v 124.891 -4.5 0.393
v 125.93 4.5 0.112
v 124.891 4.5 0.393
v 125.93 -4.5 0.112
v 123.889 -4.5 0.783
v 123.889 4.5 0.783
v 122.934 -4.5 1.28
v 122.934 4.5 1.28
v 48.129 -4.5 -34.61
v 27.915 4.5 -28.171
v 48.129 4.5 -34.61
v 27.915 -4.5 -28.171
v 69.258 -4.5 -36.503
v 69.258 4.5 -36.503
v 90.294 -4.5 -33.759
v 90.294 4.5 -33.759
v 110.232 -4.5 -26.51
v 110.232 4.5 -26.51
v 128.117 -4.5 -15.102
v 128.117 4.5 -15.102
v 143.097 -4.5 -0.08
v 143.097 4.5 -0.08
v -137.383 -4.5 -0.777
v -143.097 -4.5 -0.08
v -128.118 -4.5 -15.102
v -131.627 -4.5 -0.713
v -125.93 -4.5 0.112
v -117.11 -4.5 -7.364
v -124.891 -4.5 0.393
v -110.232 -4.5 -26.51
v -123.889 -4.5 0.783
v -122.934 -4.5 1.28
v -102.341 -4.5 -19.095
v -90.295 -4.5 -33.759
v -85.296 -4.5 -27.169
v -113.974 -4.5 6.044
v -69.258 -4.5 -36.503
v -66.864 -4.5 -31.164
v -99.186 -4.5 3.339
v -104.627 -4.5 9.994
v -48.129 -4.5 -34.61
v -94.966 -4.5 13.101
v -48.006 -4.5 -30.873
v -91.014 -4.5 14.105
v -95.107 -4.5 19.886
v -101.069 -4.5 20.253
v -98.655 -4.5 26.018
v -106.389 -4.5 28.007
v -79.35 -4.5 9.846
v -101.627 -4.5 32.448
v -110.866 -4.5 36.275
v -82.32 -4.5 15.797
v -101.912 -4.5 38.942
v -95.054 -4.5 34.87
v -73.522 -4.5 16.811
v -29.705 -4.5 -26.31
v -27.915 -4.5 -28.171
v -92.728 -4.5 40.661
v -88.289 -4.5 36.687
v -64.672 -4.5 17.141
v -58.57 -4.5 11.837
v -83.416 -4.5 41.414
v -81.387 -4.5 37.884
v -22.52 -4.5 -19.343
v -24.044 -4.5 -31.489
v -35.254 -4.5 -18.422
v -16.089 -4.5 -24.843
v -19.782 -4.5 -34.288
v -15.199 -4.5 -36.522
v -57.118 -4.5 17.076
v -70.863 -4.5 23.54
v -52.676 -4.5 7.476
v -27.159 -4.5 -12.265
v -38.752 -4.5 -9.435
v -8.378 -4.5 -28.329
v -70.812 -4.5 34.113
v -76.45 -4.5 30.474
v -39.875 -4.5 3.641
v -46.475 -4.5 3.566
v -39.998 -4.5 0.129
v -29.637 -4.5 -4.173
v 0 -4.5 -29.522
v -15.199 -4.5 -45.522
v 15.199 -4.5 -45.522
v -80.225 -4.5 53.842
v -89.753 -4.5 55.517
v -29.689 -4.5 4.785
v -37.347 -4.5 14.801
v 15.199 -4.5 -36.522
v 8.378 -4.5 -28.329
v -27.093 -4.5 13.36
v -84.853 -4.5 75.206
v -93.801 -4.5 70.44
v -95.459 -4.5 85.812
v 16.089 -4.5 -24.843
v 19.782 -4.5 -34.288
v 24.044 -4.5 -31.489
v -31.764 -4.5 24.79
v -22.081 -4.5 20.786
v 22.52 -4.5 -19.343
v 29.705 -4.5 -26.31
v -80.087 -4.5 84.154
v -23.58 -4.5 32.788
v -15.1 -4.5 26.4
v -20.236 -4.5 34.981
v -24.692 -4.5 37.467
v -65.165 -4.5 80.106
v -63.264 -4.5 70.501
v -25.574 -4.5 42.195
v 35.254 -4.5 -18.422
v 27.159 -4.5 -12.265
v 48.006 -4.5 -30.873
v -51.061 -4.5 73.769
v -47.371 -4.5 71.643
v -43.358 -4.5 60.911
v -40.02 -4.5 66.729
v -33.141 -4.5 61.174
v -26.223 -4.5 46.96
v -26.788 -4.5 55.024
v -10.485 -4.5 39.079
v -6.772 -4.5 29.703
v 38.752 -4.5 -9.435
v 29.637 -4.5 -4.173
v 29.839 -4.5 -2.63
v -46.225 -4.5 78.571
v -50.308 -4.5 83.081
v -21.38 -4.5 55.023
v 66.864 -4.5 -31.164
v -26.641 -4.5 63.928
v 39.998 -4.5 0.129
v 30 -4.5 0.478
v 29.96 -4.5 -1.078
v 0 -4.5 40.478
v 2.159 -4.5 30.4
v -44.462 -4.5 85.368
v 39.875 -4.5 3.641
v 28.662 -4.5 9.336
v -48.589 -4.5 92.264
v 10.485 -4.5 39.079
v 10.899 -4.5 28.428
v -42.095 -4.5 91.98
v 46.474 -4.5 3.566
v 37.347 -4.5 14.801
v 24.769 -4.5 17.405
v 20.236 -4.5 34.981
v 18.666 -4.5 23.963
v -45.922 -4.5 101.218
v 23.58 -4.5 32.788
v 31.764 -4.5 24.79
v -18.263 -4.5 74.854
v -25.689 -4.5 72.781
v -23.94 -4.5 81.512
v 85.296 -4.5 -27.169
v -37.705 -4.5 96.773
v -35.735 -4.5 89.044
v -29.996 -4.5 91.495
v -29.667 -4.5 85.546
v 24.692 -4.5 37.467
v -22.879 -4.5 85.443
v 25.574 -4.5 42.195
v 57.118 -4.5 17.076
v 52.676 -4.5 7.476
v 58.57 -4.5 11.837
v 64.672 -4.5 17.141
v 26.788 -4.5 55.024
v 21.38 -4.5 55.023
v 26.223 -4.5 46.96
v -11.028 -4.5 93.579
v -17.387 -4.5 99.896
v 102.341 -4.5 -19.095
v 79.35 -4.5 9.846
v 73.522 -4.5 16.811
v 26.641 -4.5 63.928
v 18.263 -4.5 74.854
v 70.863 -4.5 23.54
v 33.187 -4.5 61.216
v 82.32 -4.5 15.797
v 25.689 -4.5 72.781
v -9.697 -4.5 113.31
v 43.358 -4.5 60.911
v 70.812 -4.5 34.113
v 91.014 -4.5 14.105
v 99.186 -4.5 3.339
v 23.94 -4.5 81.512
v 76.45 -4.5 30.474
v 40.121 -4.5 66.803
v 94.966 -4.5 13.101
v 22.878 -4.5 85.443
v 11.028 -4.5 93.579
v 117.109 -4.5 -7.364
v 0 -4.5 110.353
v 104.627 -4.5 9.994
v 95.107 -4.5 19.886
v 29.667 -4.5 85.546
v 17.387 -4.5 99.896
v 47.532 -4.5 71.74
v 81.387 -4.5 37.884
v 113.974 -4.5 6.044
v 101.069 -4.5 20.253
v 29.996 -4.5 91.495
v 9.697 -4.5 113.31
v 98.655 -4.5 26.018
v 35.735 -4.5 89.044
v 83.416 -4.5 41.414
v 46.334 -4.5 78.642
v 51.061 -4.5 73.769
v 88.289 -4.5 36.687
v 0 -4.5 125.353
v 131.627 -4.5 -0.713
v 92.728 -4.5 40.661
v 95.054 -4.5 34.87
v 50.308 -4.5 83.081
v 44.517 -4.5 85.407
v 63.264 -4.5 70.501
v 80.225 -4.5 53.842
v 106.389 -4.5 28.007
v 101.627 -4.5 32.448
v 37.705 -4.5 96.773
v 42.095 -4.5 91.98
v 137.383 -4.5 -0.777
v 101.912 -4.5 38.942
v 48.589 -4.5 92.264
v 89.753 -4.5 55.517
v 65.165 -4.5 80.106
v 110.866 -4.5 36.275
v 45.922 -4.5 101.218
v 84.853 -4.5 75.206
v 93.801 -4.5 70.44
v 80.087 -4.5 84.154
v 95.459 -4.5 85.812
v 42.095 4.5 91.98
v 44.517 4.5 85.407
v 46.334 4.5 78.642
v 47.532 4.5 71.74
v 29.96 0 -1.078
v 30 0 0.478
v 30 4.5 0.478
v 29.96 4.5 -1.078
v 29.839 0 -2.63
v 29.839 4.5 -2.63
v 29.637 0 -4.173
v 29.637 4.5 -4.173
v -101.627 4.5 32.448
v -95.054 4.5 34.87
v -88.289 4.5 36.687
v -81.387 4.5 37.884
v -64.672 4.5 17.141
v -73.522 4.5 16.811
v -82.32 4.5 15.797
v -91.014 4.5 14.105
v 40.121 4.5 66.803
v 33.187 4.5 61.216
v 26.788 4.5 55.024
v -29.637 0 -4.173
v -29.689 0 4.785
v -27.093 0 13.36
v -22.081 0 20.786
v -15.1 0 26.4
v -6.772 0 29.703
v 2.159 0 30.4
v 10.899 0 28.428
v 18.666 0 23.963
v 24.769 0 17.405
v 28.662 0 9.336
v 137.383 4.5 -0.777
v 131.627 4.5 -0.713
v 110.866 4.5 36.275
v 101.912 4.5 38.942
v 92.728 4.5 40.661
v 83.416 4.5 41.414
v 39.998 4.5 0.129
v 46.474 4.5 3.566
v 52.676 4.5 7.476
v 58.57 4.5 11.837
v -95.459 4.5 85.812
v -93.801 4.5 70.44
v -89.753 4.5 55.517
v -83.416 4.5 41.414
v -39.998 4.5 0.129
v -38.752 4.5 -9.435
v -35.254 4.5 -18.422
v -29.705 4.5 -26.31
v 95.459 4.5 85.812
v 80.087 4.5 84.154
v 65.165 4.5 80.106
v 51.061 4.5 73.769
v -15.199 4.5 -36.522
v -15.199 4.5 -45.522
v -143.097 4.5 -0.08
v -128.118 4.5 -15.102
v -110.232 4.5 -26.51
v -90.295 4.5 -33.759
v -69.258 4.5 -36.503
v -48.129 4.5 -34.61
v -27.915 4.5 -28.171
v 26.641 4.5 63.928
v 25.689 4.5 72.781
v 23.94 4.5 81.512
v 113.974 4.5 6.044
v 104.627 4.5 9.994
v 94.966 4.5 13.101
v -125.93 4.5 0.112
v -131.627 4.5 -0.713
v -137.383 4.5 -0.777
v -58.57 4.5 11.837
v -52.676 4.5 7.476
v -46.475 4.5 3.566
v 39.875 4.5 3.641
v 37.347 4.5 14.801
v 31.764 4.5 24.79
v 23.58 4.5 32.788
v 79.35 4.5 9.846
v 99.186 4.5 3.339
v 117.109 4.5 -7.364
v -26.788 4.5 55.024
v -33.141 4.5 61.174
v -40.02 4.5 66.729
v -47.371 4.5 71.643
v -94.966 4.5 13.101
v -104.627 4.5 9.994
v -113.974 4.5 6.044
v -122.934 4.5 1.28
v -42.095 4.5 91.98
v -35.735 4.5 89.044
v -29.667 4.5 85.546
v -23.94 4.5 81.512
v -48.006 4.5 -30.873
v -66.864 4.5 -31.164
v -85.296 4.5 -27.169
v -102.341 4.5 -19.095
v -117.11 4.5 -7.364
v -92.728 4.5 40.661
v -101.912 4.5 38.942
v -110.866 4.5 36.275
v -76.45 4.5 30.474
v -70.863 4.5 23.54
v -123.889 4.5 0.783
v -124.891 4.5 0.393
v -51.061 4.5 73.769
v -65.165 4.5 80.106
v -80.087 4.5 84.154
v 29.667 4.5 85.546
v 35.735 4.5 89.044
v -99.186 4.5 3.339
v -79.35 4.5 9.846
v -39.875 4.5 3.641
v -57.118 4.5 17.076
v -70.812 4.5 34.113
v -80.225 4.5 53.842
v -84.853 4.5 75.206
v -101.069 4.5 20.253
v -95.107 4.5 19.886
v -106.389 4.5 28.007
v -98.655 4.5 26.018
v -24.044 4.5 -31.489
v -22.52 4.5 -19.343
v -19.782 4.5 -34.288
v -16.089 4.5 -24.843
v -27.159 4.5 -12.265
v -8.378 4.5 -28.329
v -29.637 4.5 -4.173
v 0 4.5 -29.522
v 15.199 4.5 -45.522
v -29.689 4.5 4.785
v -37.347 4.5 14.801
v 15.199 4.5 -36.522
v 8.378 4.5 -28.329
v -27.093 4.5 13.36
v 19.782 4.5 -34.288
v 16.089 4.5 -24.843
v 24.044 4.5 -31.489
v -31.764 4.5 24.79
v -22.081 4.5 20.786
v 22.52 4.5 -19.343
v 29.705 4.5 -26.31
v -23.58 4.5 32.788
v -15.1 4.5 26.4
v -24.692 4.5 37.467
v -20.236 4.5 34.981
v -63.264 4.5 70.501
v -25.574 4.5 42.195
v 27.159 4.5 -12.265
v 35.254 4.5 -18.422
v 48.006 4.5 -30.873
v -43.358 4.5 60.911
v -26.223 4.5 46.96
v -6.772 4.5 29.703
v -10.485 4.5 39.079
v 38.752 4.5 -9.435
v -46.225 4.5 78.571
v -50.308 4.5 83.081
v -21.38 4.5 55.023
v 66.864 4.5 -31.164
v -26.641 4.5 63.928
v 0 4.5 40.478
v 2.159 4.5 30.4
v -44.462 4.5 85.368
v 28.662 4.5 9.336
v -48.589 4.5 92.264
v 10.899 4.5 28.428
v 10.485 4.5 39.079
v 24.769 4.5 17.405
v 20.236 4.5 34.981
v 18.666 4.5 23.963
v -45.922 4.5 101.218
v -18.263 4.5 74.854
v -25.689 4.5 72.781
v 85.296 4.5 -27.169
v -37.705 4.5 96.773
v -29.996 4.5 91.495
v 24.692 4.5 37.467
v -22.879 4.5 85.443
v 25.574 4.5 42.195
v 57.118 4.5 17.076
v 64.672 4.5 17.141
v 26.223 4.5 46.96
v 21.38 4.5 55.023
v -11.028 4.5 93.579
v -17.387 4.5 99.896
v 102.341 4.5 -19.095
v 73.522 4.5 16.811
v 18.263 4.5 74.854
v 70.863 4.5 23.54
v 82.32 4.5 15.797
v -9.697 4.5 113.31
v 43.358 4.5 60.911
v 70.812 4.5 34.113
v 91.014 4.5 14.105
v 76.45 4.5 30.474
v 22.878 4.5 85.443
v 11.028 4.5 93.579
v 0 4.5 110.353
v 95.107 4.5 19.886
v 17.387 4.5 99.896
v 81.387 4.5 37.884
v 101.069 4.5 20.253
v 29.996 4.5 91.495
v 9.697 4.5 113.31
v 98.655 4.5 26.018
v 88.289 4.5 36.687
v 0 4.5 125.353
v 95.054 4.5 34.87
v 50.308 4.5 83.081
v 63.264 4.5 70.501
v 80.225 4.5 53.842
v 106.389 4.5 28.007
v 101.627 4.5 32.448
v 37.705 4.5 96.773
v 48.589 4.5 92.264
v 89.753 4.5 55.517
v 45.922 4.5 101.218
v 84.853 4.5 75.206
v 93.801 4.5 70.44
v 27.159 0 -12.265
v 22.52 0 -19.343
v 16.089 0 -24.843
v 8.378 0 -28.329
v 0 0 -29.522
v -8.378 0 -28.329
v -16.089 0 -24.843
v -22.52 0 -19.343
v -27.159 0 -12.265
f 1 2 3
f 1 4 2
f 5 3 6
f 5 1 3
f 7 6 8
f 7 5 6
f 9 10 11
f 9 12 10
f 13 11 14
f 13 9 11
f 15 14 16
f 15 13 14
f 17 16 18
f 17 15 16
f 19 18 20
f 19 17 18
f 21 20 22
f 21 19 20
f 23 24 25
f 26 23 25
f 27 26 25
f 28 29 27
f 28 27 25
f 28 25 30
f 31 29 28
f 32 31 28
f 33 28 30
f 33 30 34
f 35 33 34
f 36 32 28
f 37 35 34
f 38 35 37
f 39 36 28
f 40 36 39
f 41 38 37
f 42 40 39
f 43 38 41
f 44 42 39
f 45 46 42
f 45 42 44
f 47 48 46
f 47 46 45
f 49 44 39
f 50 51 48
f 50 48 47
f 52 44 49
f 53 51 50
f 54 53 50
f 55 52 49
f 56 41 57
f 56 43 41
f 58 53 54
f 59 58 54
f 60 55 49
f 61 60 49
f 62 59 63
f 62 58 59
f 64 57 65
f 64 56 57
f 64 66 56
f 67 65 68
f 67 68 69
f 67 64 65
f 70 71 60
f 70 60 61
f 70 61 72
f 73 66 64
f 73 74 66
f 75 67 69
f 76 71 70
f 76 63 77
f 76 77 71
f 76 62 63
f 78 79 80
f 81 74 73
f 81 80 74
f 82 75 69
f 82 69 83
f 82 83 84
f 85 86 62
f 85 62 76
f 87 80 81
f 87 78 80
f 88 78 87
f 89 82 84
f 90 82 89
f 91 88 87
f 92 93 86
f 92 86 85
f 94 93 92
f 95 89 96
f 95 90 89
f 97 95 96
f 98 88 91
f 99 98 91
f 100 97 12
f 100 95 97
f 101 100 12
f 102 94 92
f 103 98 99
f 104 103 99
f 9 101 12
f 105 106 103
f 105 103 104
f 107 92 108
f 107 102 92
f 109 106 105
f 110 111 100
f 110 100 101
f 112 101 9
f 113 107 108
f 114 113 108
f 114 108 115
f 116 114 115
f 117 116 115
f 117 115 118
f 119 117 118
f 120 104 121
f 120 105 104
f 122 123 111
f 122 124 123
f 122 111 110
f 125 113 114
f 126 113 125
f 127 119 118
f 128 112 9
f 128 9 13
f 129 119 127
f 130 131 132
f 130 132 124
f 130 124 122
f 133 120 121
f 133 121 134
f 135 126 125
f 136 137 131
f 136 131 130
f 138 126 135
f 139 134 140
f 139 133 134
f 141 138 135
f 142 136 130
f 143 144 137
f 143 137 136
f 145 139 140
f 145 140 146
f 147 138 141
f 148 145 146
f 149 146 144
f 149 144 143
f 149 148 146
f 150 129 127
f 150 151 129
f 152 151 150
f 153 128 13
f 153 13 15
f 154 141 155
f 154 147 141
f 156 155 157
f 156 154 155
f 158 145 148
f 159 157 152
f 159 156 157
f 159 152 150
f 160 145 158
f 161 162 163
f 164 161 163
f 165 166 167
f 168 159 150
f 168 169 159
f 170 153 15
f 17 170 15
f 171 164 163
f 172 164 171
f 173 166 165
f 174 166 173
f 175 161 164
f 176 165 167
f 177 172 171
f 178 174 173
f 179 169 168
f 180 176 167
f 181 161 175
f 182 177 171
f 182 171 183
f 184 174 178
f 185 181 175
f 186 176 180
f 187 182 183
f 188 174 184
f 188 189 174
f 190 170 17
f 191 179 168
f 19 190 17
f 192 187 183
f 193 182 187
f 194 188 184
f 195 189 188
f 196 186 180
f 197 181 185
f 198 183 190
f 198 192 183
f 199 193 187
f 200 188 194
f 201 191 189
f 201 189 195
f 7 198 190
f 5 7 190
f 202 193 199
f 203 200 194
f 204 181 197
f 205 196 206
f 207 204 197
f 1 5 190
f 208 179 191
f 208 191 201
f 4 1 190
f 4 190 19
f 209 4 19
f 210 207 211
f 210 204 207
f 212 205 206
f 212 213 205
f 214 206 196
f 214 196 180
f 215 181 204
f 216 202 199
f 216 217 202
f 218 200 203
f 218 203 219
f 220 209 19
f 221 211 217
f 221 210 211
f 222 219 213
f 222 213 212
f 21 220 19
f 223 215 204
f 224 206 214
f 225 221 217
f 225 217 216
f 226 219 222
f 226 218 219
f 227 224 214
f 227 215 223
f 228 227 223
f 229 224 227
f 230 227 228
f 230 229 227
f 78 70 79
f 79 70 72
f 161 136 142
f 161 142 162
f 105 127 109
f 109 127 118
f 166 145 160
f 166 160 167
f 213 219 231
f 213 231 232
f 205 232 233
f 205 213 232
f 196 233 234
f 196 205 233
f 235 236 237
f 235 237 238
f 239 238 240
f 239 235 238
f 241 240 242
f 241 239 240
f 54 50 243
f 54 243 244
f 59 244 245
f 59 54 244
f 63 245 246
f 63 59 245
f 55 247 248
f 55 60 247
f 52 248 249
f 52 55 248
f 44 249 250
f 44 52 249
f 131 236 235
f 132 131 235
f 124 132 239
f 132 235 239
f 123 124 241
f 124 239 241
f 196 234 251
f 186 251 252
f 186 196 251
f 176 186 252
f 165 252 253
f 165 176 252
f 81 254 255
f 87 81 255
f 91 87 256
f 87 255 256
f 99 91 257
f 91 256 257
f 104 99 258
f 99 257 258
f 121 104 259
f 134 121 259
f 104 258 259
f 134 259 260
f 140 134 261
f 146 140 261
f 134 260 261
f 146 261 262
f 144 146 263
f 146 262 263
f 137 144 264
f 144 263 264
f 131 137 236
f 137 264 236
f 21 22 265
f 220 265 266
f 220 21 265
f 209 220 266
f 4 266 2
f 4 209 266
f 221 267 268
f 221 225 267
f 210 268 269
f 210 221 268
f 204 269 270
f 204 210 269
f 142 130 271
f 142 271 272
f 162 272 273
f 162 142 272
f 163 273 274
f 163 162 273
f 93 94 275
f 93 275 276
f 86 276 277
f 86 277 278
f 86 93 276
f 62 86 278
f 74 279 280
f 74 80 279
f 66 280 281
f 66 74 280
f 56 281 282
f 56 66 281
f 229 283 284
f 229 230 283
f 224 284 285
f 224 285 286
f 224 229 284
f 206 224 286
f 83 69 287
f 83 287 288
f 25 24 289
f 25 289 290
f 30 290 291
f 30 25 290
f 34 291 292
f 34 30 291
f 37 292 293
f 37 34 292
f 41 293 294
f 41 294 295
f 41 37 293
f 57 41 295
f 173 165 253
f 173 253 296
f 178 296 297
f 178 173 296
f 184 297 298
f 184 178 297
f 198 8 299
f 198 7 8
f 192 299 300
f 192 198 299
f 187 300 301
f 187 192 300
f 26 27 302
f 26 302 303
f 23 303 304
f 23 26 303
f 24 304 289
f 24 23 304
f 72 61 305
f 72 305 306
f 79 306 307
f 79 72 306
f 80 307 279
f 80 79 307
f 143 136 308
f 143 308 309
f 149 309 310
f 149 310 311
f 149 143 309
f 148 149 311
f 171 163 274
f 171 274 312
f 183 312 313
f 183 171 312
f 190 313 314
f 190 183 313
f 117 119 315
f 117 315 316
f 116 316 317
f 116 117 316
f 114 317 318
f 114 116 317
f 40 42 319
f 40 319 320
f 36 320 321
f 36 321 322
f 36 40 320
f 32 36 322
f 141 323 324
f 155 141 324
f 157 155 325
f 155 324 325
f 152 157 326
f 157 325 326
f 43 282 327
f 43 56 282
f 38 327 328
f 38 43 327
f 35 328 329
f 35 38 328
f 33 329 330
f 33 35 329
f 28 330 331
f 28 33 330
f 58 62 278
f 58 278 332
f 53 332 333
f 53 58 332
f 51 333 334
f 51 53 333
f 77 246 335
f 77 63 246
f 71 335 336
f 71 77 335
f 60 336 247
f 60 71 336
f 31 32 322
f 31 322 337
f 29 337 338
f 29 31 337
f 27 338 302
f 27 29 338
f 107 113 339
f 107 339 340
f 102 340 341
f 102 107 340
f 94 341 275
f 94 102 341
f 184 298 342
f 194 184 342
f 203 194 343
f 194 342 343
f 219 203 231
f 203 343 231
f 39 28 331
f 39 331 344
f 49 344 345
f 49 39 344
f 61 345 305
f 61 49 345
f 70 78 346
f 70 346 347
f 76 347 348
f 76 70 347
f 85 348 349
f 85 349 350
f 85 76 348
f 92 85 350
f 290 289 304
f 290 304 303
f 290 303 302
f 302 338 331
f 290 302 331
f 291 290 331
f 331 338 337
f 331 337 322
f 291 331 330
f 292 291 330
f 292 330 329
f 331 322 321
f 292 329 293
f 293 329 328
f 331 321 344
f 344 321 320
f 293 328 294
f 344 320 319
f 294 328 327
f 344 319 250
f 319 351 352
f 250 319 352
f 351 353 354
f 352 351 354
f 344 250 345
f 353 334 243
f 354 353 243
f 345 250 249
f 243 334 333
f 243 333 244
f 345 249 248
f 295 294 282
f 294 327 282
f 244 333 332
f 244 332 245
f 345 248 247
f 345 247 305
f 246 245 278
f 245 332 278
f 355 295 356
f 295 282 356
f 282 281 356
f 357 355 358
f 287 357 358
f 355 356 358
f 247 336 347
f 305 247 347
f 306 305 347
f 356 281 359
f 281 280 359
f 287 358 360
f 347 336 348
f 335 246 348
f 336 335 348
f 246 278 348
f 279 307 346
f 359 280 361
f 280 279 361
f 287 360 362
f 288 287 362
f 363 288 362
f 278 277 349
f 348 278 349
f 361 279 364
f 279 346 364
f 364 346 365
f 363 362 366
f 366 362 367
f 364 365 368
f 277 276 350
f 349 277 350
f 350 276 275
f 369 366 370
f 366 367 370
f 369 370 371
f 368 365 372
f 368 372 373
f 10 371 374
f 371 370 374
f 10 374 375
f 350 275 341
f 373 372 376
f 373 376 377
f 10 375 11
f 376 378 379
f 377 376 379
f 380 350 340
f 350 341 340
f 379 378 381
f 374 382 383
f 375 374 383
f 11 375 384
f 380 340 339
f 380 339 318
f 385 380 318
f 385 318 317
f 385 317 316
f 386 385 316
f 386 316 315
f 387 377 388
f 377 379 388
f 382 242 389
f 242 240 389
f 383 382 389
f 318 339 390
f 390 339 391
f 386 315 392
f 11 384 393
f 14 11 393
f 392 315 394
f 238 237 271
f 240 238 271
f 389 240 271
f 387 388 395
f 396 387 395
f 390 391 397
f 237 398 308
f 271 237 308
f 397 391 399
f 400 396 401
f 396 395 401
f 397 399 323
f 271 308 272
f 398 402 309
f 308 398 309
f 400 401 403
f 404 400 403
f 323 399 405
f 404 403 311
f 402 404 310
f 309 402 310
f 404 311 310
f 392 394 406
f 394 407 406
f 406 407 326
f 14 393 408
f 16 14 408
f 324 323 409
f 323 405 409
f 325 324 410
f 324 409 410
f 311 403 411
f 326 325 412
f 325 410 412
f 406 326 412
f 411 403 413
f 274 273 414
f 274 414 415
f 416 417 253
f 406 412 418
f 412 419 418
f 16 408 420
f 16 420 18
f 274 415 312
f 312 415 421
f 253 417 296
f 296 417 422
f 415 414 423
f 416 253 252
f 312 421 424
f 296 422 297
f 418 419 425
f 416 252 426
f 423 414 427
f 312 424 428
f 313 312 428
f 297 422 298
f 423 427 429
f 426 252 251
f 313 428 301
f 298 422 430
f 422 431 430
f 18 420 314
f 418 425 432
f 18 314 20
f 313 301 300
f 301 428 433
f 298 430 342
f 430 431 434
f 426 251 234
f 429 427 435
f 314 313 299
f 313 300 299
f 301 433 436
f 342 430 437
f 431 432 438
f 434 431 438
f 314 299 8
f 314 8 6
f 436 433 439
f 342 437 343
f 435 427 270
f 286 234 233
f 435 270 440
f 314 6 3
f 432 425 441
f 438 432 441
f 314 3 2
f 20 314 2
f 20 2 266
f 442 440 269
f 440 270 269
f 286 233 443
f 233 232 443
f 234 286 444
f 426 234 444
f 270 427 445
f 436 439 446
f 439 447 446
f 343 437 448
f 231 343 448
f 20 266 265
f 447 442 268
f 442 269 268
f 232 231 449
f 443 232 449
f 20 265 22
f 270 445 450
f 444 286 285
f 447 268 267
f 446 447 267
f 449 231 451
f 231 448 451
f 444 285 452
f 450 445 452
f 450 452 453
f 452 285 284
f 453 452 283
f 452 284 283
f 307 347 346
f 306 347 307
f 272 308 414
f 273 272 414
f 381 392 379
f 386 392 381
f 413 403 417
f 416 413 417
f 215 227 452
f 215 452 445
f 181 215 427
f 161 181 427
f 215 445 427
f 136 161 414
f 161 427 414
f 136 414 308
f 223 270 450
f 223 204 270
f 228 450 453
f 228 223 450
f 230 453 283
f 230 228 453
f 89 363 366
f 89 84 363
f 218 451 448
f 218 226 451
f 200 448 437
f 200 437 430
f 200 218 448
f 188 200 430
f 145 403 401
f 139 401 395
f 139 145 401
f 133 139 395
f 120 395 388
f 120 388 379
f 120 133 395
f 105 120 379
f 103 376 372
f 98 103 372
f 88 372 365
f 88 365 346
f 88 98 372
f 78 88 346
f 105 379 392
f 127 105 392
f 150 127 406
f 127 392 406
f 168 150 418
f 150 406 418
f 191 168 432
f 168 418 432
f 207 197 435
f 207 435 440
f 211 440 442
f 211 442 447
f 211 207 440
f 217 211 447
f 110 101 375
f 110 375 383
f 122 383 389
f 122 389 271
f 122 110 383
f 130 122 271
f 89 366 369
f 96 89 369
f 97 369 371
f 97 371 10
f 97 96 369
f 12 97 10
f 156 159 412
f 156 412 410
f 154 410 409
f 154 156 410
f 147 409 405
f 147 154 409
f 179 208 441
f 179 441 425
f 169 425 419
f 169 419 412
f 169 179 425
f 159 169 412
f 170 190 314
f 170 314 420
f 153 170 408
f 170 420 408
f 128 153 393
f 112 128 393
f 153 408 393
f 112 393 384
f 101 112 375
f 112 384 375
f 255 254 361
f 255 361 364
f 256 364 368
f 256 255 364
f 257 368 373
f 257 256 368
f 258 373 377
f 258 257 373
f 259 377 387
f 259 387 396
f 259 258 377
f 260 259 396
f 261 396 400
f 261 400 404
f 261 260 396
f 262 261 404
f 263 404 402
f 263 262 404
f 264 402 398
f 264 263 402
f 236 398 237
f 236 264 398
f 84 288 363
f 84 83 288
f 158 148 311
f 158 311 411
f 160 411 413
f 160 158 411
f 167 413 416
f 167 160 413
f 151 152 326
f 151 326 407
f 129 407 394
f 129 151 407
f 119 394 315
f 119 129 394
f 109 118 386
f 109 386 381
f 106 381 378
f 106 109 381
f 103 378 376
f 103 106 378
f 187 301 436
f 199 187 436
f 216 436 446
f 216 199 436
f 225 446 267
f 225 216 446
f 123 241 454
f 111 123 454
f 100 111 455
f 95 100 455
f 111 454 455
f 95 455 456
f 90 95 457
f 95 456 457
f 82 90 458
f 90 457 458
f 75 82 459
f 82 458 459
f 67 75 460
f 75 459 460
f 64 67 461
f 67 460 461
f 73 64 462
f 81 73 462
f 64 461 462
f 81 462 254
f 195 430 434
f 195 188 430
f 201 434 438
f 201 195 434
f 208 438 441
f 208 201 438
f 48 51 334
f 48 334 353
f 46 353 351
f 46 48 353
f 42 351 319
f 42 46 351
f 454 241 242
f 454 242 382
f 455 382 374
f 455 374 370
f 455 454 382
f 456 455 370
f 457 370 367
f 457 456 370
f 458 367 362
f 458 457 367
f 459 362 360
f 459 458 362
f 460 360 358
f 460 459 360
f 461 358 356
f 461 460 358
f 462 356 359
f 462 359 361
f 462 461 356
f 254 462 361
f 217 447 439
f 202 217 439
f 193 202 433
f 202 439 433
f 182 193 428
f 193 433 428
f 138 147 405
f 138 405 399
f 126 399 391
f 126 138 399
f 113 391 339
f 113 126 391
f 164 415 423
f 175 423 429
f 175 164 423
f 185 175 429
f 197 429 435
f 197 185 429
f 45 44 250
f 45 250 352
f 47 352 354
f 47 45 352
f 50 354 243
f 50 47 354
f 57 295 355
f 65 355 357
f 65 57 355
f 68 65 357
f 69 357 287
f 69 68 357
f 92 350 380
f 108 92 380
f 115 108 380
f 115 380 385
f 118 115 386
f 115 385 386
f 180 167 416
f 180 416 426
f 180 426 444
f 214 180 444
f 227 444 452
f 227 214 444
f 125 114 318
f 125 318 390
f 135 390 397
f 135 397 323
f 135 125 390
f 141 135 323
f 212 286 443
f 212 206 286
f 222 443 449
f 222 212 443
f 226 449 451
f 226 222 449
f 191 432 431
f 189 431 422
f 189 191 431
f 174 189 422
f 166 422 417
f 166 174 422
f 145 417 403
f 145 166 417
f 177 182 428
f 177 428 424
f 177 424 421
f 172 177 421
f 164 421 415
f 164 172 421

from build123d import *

# Parameters (mm, degrees)
F1_DEPTH = 4.5


# Not quite as in the source:
# - ends of sketch curves that miss each other by under 0.0002 mm in the source are joined


with BuildPart() as f1:
    # F0 (on Front) → F1 (new body, symmetric)
    with BuildSketch(Plane.XZ):
        with BuildLine():
            ThreePointArc((22.8784841202, 85.4427339913), (13.8060493669, 106.7545909747), (-1.20352e-05, 125.3528970532))
            ThreePointArc((-1.20352e-05, 125.3528970532), (-13.8060738367, 106.7545832167), (-22.8785085989, 85.4427260857))
            ThreePointArc((-22.8785085989, 85.4427260857), (-33.781429845, 94.2345199978), (-45.9220242093, 101.2184408782))
            ThreePointArc((-45.9220242093, 101.2184408782), (-49.5683429395, 87.6953665193), (-51.06114092, 73.7691058897))
            ThreePointArc((-51.06114092, 73.7691058897), (-72.5460800364, 82.4236845525), (-95.4594281867, 85.8123133595))
            ThreePointArc((-95.4594281867, 85.8123133595), (-92.0708001004, 62.8989646397), (-83.4162216453, 41.4140256538))
            ThreePointArc((-83.4162216453, 41.4140256538), (-97.3424818216, 39.9212276371), (-110.8655561911, 36.2749088727))
            ThreePointArc((-110.8655561911, 36.2749088727), (-103.8306945008, 24.0599857757), (-94.9659655862, 13.1005055314))
            ThreePointArc((-94.9659655862, 13.1005055314), (-109.3441086085, 8.1228594383), (-122.9337436667, 1.2796299938))
            ThreePointArc((-122.9337436667, 1.2796299938), (-124.3847743538, 0.5744976537), (-125.9303092338, 0.1118710562))
            ThreePointArc((-125.9303092338, 0.1118710562), (-134.5040813307, -0.8405705466), (-143.0970012567, -0.0800174007))
            ThreePointArc((-143.0970012567, -0.0800174007), (-90.2945054943, -33.7590284811), (-27.9154142382, -28.1707970164))
            ThreePointArc((-27.9154142382, -28.1707970164), (-21.9577774473, -32.956766848), (-15.1986970778, -36.5224048048))
            Line((-15.1986970778, -36.5224048048), (-15.1986972, -45.5224051023))
            Line((-15.1986972, -45.5224051023), (15.1986718, -45.5224051023))
            Line((15.1986718, -45.5224051023), (15.1986718, -36.5224051023))
            ThreePointArc((15.1986718, -36.5224051023), (21.9577523614, -32.9567672985), (27.9153889991, -28.1707973067))
            ThreePointArc((27.9153889991, -28.1707973067), (90.2944800943, -33.7590284811), (143.096975735, -0.0800170504))
            ThreePointArc((143.096975735, -0.0800170504), (134.5040559307, -0.8405705466), (125.9302837161, 0.1118705041))
            ThreePointArc((125.9302837161, 0.1118705041), (124.3847489538, 0.5744976537), (122.9337187314, 1.2796307814))
            ThreePointArc((122.9337187314, 1.2796307814), (109.3440836528, 8.1228592505), (94.9659404823, 13.1005047349))
            ThreePointArc((94.9659404823, 13.1005047349), (103.8306699794, 24.0599855987), (110.8655315962, 36.2749085192))
            ThreePointArc((110.8655315962, 36.2749085192), (97.3424564216, 39.9212276371), (83.416195792, 41.4140256177))
            ThreePointArc((83.416195792, 41.4140256177), (92.0707747004, 62.8989646397), (95.4594032906, 85.8123128836))
            ThreePointArc((95.4594032906, 85.8123128836), (72.5460546364, 82.4236845525), (51.0611157869, 73.7691059217))
            ThreePointArc((51.0611157869, 73.7691059217), (49.568318506, 87.695366698), (45.9219996628, 101.2184412045))
            ThreePointArc((45.9219996628, 101.2184412045), (33.7814018374, 94.2345137024), (22.8784841202, 85.4427339913))
        make_face()
        with BuildLine():
            ThreePointArc((-117.1095228717, -7.3640305351), (-89.448563488, 7.1418522166), (-58.5697361978, 11.837311045))
            ThreePointArc((-58.5697361978, 11.837311045), (-49.6119110254, 5.4631464022), (-39.9984925953, 0.1288430808))
            ThreePointArc((-39.9984925953, 0.1288430808), (-37.2748571799, -14.0339843315), (-29.705402075, -26.3102719896))
            ThreePointArc((-29.705402075, -26.3102719896), (-76.1944797379, -29.6944118928), (-117.1095228717, -7.3640305351))
        make_face(mode=Mode.SUBTRACT)
        with BuildLine():
            ThreePointArc((-91.0135912807, 14.1048128348), (-96.9513599422, 22.91124928), (-101.6267610462, 32.4480749604))
            ThreePointArc((-101.6267610462, 32.4480749604), (-91.6920273332, 35.8548732281), (-81.3873643524, 37.8844380956))
            ThreePointArc((-81.3873643524, 37.8844380956), (-73.7352473768, 26.9438563456), (-64.6715808547, 17.1407372042))
            ThreePointArc((-64.6715808547, 17.1407372042), (-77.9309186705, 16.3892197846), (-91.0135912807, 14.1048128348))
        make_face(mode=Mode.SUBTRACT)
        with BuildLine():
            ThreePointArc((-39.8747349061, 3.6409013815), (-70.812382671, 34.1134059196), (-84.8528261577, 75.2057109018))
            ThreePointArc((-84.8528261577, 75.2057109018), (-53.0294964681, 66.289674717), (-26.223286677, 46.9597204349))
            ThreePointArc((-26.223286677, 46.9597204349), (-25.1618451244, 39.8254262579), (-23.5802802502, 32.7881348844))
            ThreePointArc((-23.5802802502, 32.7881348844), (-34.9145400541, 19.9961948661), (-39.8747349061, 3.6409013815))
        make_face(mode=Mode.SUBTRACT)
        with BuildLine():
            ThreePointArc((58.569710798, 11.8373110298), (89.4485382345, 7.1418524965), (117.109497837, -7.3640300535))
            ThreePointArc((117.109497837, -7.3640300535), (76.1944543379, -29.6944118928), (29.7053768652, -26.3102719286))
            ThreePointArc((29.7053768652, -26.3102719286), (37.2748326568, -14.0339846476), (39.9984674303, 0.1288438922))
            ThreePointArc((39.9984674303, 0.1288438922), (49.6118856254, 5.4631464022), (58.569710798, 11.8373110298))
        make_face(mode=Mode.SUBTRACT)
        with BuildLine():
            ThreePointArc((-29.6372783208, -4.1734756121), (-2.3326090766, 30.3867739538), (29.9999878, 0.4775948977))
            ThreePointArc((29.9999878, 0.4775948977), (29.9091668501, -1.8550020562), (29.6372538967, -4.1734757653))
            ThreePointArc((29.6372538967, -4.1734757653), (-1.22775e-05, -29.5224051023), (-29.6372783208, -4.1734756121))
        make_face(mode=Mode.SUBTRACT)
        with BuildLine():
            ThreePointArc((26.2232617618, 46.9597209347), (53.0294713817, 66.2896748681), (84.8528008041, 75.2057108554))
            ThreePointArc((84.8528008041, 75.2057108554), (70.812357271, 34.1134059196), (39.8747095061, 3.6409013815))
            ThreePointArc((39.8747095061, 3.6409013815), (34.9145154377, 19.9961952532), (23.5802548967, 32.7881350301))
            ThreePointArc((23.5802548967, 32.7881350301), (25.161820701, 39.8254261326), (26.2232617618, 46.9597209347))
        make_face(mode=Mode.SUBTRACT)
        with BuildLine():
            ThreePointArc((81.3873389524, 37.8844380956), (91.6920019332, 35.8548732281), (101.6267360258, 32.4480754342))
            ThreePointArc((101.6267360258, 32.4480754342), (96.9513354477, 22.9112491166), (91.0135668807, 14.1048128348))
            ThreePointArc((91.0135668807, 14.1048128348), (77.930893754, 16.3892197289), (64.6715548016, 17.1407368356))
            ThreePointArc((64.6715548016, 17.1407368356), (73.7352219768, 26.9438563456), (81.3873389524, 37.8844380956))
        make_face(mode=Mode.SUBTRACT)
        with BuildLine():
            ThreePointArc((-47.3705884445, 71.6430268074), (-45.4199295453, 81.9895572502), (-42.0951898382, 91.9796457495))
            ThreePointArc((-42.0951898382, 91.9796457495), (-32.6613025725, 87.3636976735), (-23.9396864079, 81.5123196292))
            ThreePointArc((-23.9396864079, 81.5123196292), (-26.2649806939, 68.3652971805), (-26.7878526914, 55.0244649123))
            ThreePointArc((-26.7878526914, 55.0244649123), (-36.517789196, 64.0291013139), (-47.3705884445, 71.6430268074))
        make_face(mode=Mode.SUBTRACT)
        with BuildLine():
            ThreePointArc((-20.2364600157, 34.9810104129), (-18.2633780761, 74.8538230805), (-1.22419e-05, 110.352889417))
            ThreePointArc((-1.22419e-05, 110.352889417), (18.2633527585, 74.8538302889), (20.2364346157, 34.9810179281))
            ThreePointArc((20.2364346157, 34.9810179281), (-1.26313e-05, 40.4775948977), (-20.2364600157, 34.9810104129))
        make_face(mode=Mode.SUBTRACT)
        with BuildLine():
            ThreePointArc((23.9396582776, 81.5123130375), (32.6612744421, 87.3636910819), (42.0951621324, 91.9796391523))
            ThreePointArc((42.0951621324, 91.9796391523), (45.5019631468, 82.0449119699), (47.5315280138, 71.7402489249))
            ThreePointArc((47.5315280138, 71.7402489249), (36.5909469807, 64.0881318591), (26.7878276352, 55.0244650532))
            ThreePointArc((26.7878276352, 55.0244650532), (26.2649562826, 68.3652972858), (23.9396582776, 81.5123130375))
        make_face(mode=Mode.SUBTRACT)
    extrude(amount=F1_DEPTH, both=True)


solid = f1.part
